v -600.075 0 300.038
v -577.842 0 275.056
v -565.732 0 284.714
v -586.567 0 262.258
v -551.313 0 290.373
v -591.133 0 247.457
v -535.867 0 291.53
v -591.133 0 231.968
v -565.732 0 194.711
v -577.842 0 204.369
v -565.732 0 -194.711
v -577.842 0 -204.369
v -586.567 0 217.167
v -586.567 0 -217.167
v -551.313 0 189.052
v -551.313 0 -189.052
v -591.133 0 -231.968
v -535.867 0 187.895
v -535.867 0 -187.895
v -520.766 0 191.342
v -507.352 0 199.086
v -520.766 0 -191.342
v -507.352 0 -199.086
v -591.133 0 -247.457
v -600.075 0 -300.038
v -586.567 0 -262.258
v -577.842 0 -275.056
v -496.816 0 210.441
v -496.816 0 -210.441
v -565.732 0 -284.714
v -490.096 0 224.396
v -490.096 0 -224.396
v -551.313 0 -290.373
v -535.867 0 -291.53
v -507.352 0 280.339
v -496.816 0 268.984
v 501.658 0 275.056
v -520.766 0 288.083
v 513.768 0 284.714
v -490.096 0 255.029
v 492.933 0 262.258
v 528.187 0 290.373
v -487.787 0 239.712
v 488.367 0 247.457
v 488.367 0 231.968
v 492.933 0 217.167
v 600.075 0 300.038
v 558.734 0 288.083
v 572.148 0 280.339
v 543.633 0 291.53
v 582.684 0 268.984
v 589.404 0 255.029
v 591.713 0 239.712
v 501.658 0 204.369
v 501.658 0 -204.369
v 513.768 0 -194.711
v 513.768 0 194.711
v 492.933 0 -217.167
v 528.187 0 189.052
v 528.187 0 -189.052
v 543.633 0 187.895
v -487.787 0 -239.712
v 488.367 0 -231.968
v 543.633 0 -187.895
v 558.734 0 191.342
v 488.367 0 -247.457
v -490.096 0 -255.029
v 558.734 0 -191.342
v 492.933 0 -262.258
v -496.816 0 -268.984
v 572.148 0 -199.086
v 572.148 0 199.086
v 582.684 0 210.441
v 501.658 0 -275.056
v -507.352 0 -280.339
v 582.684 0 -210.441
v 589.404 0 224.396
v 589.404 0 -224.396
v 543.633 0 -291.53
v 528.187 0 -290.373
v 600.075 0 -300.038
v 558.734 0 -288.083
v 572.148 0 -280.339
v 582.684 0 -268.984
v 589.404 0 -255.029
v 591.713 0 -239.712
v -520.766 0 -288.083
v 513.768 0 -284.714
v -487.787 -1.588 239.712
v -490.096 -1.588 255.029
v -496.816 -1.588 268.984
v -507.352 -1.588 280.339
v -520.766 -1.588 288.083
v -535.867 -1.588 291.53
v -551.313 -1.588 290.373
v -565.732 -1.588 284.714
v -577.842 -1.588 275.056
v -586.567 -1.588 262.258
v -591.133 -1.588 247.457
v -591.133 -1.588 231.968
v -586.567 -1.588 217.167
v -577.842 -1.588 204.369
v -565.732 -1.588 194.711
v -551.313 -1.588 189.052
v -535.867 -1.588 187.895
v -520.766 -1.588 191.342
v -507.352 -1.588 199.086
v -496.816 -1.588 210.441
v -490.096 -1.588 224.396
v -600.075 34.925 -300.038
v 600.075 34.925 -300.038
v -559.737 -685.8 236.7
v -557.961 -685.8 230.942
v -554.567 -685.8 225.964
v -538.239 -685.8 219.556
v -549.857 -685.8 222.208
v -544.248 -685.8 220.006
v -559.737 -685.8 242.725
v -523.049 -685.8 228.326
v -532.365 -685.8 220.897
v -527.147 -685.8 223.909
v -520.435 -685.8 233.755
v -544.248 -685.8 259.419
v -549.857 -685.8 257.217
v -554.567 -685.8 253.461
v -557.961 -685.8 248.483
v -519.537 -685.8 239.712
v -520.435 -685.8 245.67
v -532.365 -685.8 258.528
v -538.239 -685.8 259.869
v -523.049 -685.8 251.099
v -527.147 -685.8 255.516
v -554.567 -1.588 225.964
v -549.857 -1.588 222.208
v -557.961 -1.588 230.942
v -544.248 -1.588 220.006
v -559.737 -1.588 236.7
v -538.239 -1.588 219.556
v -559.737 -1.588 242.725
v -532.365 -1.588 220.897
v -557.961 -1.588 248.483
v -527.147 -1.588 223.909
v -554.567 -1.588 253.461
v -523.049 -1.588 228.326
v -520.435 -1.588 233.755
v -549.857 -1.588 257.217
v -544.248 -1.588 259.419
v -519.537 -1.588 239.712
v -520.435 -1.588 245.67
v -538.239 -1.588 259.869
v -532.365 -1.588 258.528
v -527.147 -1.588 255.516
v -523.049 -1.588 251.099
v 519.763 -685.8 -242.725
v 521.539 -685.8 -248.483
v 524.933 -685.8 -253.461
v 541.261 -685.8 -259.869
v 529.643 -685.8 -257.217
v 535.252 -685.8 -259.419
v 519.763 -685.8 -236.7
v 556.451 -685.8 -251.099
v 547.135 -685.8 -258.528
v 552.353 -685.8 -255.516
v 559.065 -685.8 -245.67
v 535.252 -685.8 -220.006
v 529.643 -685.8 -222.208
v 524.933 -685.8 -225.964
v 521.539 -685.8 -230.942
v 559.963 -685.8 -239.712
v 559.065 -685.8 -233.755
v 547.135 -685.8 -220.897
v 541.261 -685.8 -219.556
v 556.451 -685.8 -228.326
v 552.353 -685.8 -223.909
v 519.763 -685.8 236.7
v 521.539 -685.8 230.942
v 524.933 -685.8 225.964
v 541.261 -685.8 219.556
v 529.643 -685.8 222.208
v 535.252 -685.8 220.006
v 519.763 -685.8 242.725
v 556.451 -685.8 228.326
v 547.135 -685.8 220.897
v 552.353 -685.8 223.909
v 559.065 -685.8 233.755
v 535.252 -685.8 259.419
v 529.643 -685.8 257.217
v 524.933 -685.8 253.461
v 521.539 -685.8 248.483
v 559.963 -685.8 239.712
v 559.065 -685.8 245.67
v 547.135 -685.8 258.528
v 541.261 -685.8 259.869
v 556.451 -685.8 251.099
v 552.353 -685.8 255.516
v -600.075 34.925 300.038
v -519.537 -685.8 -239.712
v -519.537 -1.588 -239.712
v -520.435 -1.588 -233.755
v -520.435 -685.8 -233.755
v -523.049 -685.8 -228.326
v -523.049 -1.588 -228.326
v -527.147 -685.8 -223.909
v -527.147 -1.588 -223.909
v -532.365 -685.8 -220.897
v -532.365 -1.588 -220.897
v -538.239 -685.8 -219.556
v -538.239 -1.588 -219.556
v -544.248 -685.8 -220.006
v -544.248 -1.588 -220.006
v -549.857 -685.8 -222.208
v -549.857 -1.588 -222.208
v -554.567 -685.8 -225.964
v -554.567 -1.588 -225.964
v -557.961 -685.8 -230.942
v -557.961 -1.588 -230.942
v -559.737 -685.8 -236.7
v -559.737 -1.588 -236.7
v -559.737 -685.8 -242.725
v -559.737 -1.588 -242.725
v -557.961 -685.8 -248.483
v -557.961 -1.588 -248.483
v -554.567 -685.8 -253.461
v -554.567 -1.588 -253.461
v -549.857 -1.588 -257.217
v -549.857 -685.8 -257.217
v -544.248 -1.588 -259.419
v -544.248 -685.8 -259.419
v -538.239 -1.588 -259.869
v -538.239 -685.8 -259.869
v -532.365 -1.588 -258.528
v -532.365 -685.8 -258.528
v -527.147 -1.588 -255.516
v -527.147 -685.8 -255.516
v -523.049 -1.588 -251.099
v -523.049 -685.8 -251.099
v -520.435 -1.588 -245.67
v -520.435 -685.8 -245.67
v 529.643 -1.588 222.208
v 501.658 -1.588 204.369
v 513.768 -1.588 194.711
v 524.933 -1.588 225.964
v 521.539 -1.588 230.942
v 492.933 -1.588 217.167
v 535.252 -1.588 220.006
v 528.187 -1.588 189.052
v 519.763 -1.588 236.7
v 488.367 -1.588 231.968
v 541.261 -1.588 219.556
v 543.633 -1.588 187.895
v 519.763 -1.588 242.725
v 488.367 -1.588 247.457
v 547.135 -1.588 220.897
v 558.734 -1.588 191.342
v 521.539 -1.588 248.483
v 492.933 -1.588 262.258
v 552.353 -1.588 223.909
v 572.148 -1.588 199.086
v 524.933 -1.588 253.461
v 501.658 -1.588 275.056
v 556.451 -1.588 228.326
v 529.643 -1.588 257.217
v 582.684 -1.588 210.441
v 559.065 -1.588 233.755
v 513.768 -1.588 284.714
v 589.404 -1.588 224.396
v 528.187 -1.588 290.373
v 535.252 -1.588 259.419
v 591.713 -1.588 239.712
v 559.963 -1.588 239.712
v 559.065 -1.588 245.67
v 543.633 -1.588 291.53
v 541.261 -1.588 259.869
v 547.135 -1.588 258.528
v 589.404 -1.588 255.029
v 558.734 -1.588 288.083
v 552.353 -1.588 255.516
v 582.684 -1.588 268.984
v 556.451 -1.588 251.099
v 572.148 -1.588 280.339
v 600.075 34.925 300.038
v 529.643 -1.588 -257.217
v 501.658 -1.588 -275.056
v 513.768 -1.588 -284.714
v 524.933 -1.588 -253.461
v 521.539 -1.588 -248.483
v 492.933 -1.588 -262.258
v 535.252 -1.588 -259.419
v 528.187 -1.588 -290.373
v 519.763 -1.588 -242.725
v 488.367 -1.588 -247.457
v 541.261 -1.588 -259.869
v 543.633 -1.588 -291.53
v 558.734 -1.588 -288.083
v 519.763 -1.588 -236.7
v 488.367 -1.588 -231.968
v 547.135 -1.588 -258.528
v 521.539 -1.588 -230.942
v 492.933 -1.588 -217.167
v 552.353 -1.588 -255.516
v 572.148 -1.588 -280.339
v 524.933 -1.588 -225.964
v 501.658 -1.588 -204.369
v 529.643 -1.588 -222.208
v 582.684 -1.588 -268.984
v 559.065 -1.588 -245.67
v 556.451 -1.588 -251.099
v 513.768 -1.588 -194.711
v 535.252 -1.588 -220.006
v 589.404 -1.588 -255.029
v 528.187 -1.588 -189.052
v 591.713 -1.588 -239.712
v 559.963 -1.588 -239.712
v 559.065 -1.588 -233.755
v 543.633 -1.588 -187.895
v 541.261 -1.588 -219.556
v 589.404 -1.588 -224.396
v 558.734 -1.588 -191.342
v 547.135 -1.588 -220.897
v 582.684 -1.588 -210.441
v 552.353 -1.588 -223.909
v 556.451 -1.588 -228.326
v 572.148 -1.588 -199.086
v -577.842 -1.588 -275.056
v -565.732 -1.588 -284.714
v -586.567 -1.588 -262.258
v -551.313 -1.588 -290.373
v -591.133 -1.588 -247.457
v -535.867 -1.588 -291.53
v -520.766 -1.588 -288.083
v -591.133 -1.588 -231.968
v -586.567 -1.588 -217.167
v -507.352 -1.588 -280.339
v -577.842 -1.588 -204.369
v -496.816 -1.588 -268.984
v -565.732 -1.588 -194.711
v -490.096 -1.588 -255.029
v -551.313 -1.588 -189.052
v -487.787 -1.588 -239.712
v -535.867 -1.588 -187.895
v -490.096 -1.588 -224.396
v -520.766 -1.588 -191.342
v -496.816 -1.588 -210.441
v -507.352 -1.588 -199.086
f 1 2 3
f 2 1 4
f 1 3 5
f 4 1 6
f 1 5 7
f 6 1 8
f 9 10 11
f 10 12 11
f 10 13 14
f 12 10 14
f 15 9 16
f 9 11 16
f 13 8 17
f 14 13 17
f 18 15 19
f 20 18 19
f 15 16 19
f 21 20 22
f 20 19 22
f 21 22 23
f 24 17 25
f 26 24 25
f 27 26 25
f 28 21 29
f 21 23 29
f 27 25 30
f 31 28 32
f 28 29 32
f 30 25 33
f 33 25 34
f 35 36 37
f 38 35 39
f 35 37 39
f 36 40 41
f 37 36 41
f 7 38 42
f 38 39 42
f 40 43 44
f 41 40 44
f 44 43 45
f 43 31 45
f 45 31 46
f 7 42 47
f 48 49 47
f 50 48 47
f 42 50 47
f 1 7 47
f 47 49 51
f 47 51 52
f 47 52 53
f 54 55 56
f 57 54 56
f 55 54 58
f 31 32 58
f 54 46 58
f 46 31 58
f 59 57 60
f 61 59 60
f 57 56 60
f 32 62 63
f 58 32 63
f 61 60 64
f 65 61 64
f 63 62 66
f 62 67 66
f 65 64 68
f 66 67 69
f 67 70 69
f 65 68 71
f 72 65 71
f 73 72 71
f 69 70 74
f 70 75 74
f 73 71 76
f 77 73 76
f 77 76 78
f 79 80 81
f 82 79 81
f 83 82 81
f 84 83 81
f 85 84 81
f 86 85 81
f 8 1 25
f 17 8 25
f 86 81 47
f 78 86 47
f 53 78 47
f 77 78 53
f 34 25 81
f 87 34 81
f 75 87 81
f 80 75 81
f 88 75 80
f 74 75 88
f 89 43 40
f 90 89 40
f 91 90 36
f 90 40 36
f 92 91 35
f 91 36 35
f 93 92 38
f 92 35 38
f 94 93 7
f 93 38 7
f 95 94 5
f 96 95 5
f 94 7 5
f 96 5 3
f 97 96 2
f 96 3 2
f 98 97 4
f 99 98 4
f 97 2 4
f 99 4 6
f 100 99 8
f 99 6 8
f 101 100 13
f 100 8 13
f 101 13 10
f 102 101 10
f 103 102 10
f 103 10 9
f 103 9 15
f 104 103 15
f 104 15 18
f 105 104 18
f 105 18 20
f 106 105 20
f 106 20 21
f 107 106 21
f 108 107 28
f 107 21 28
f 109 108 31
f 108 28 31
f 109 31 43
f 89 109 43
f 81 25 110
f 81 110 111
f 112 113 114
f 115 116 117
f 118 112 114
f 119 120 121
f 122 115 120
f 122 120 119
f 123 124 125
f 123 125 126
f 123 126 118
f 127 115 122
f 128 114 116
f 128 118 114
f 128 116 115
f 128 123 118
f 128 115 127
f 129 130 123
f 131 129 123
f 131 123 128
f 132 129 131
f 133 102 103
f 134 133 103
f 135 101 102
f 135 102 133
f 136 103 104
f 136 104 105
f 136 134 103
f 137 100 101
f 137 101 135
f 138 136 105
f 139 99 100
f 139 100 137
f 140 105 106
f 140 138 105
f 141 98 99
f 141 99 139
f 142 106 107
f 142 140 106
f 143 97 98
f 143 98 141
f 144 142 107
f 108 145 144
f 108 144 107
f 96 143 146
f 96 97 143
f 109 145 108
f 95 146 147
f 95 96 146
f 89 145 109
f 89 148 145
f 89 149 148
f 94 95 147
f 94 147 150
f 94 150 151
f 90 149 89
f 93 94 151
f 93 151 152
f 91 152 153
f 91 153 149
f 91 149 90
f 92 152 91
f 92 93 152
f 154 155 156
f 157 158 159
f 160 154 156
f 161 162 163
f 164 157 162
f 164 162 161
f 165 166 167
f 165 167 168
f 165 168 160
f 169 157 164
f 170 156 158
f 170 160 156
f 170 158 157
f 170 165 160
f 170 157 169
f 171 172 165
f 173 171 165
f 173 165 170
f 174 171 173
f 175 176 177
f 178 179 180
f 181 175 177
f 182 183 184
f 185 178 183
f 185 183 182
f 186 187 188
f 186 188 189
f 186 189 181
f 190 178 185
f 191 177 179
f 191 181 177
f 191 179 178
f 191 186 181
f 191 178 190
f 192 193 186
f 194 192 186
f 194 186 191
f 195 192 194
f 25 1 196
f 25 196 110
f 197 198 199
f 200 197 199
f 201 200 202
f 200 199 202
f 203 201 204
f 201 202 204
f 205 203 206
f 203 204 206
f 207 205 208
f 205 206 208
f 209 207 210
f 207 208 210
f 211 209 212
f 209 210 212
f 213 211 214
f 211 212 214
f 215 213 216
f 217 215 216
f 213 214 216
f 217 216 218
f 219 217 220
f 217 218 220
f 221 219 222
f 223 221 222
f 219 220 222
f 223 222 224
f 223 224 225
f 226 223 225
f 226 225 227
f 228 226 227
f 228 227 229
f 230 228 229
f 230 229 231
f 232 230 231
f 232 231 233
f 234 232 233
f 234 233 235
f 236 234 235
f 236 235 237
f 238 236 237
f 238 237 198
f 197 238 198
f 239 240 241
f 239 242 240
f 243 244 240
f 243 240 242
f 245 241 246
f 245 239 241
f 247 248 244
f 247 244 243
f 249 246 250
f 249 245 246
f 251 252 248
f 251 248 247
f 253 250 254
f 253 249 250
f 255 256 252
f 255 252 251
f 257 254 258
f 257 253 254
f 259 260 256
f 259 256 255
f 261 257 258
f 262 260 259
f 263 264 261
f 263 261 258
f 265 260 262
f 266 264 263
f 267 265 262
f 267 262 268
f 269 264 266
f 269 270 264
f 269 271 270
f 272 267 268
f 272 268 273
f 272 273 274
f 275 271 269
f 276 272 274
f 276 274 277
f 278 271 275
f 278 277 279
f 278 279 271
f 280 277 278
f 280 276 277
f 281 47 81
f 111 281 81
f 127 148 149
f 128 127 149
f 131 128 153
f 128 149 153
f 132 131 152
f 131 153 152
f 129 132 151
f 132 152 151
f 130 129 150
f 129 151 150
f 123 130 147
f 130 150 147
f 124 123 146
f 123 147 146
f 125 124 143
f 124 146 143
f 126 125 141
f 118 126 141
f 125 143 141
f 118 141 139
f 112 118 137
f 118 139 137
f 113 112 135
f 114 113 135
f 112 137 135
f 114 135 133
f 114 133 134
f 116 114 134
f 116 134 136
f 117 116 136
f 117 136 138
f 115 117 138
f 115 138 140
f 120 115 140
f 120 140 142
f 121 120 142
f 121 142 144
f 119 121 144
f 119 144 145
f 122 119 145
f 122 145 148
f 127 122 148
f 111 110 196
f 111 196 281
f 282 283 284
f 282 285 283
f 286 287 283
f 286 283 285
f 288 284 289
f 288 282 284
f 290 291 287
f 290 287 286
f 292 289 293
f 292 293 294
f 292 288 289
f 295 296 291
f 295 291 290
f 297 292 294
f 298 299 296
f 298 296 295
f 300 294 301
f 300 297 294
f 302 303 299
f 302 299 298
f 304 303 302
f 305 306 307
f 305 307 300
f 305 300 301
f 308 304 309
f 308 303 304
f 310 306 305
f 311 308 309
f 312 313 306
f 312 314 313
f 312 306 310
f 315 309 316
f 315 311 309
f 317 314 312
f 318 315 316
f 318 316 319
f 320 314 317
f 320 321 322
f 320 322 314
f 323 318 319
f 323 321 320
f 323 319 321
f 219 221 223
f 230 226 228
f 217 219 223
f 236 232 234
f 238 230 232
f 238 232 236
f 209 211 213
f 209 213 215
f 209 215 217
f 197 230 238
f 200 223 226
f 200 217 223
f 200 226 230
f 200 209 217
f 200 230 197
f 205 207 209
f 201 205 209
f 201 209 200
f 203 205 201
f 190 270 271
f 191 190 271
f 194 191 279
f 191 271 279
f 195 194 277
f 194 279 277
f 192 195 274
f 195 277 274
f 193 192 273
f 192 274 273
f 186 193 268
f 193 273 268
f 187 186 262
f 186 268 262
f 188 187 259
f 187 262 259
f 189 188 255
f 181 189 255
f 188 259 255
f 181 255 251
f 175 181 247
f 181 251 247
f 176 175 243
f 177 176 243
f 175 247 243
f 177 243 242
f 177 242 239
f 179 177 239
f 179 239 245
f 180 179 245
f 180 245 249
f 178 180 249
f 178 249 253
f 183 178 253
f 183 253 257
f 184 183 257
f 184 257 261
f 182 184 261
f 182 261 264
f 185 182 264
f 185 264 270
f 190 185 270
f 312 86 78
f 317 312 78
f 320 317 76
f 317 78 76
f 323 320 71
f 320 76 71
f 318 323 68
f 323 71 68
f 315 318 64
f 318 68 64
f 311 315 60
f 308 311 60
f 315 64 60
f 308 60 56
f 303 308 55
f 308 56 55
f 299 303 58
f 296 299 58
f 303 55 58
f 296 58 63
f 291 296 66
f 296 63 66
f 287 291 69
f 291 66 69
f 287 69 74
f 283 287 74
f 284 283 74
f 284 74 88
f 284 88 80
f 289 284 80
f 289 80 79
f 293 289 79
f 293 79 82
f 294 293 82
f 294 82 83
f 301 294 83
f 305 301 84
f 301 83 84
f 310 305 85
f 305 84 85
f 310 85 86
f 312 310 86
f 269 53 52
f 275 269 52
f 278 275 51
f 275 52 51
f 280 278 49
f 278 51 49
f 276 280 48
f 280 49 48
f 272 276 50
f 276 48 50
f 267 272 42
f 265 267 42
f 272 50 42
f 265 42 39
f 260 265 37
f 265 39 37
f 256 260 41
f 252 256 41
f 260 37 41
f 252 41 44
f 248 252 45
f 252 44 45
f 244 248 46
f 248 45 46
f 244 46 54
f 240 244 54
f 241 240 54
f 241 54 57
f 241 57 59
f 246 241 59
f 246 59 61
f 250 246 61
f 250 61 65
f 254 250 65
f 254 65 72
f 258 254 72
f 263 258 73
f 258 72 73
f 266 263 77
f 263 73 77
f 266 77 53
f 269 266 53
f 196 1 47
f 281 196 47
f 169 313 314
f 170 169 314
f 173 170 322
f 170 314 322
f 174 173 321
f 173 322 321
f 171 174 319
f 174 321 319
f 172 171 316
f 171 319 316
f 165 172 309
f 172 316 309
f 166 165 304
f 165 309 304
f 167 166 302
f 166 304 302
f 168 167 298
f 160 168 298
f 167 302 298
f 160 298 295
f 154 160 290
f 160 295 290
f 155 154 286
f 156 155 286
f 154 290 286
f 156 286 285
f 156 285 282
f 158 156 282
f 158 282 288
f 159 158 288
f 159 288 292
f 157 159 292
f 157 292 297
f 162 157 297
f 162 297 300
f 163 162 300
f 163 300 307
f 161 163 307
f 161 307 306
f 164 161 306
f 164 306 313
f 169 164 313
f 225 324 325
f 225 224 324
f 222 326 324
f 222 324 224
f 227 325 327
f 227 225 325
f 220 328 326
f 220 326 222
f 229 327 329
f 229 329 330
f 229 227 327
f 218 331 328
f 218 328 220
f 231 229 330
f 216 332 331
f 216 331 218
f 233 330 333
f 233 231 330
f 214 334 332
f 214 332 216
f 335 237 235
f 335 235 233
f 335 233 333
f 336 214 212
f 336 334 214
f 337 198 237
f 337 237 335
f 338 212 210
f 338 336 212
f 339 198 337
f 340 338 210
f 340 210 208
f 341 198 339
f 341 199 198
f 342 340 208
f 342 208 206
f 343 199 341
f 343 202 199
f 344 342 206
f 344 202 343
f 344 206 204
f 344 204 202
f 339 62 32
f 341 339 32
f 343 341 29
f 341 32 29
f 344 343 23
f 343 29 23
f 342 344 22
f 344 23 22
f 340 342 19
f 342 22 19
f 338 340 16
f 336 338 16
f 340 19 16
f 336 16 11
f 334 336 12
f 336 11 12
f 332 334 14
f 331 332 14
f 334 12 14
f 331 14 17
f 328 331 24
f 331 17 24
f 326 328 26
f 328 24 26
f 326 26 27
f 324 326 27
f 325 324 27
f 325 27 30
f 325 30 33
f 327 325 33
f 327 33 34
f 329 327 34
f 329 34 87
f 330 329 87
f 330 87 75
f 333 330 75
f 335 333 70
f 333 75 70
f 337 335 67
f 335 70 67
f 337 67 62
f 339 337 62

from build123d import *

# Parameters (mm, degrees)
SKETCH1_W           = 1200.15
SKETCH1_H           = 600.075
BOSS_EXTRUDE1_DEPTH = 34.925
SKETCH2_R           = 20.213000011
BOSS_EXTRUDE2_DEPTH = 685.8
SKETCH3_R           = 51.963000011
BOSS_EXTRUDE3_DEPTH = 1.5875


with BuildPart() as part:
    # Sketch1 → Boss-Extrude1 (new body)
    with BuildSketch(Plane(origin=(0, 0, 0), x_dir=(1, 0, 0), z_dir=(0, 1, 0))):
        Rectangle(SKETCH1_W, SKETCH1_H)
    extrude(amount=BOSS_EXTRUDE1_DEPTH)

    # Sketch2 → Boss-Extrude2 (add)
    with BuildSketch(Plane.XZ):
        with Locations((-539.75, 239.7125)):
            Circle(SKETCH2_R)
        with Locations((539.75, 239.7125)):
            Circle(SKETCH2_R)
        with Locations((-539.75, -239.7125)):
            Circle(SKETCH2_R)
        with Locations((539.75, -239.7125)):
            Circle(SKETCH2_R)
    extrude(amount=BOSS_EXTRUDE2_DEPTH)

    # Sketch3 → Boss-Extrude3 (add)
    with BuildSketch(Plane.XZ):
        with Locations((-539.75, 239.7125)):
            Circle(SKETCH3_R)
        with Locations((539.75, 239.7125)):
            Circle(SKETCH3_R)
        with Locations((539.75, -239.7125)):
            Circle(SKETCH3_R)
        with Locations((-539.75, -239.7125)):
            Circle(SKETCH3_R)
    extrude(amount=BOSS_EXTRUDE3_DEPTH)


solid = part.part
